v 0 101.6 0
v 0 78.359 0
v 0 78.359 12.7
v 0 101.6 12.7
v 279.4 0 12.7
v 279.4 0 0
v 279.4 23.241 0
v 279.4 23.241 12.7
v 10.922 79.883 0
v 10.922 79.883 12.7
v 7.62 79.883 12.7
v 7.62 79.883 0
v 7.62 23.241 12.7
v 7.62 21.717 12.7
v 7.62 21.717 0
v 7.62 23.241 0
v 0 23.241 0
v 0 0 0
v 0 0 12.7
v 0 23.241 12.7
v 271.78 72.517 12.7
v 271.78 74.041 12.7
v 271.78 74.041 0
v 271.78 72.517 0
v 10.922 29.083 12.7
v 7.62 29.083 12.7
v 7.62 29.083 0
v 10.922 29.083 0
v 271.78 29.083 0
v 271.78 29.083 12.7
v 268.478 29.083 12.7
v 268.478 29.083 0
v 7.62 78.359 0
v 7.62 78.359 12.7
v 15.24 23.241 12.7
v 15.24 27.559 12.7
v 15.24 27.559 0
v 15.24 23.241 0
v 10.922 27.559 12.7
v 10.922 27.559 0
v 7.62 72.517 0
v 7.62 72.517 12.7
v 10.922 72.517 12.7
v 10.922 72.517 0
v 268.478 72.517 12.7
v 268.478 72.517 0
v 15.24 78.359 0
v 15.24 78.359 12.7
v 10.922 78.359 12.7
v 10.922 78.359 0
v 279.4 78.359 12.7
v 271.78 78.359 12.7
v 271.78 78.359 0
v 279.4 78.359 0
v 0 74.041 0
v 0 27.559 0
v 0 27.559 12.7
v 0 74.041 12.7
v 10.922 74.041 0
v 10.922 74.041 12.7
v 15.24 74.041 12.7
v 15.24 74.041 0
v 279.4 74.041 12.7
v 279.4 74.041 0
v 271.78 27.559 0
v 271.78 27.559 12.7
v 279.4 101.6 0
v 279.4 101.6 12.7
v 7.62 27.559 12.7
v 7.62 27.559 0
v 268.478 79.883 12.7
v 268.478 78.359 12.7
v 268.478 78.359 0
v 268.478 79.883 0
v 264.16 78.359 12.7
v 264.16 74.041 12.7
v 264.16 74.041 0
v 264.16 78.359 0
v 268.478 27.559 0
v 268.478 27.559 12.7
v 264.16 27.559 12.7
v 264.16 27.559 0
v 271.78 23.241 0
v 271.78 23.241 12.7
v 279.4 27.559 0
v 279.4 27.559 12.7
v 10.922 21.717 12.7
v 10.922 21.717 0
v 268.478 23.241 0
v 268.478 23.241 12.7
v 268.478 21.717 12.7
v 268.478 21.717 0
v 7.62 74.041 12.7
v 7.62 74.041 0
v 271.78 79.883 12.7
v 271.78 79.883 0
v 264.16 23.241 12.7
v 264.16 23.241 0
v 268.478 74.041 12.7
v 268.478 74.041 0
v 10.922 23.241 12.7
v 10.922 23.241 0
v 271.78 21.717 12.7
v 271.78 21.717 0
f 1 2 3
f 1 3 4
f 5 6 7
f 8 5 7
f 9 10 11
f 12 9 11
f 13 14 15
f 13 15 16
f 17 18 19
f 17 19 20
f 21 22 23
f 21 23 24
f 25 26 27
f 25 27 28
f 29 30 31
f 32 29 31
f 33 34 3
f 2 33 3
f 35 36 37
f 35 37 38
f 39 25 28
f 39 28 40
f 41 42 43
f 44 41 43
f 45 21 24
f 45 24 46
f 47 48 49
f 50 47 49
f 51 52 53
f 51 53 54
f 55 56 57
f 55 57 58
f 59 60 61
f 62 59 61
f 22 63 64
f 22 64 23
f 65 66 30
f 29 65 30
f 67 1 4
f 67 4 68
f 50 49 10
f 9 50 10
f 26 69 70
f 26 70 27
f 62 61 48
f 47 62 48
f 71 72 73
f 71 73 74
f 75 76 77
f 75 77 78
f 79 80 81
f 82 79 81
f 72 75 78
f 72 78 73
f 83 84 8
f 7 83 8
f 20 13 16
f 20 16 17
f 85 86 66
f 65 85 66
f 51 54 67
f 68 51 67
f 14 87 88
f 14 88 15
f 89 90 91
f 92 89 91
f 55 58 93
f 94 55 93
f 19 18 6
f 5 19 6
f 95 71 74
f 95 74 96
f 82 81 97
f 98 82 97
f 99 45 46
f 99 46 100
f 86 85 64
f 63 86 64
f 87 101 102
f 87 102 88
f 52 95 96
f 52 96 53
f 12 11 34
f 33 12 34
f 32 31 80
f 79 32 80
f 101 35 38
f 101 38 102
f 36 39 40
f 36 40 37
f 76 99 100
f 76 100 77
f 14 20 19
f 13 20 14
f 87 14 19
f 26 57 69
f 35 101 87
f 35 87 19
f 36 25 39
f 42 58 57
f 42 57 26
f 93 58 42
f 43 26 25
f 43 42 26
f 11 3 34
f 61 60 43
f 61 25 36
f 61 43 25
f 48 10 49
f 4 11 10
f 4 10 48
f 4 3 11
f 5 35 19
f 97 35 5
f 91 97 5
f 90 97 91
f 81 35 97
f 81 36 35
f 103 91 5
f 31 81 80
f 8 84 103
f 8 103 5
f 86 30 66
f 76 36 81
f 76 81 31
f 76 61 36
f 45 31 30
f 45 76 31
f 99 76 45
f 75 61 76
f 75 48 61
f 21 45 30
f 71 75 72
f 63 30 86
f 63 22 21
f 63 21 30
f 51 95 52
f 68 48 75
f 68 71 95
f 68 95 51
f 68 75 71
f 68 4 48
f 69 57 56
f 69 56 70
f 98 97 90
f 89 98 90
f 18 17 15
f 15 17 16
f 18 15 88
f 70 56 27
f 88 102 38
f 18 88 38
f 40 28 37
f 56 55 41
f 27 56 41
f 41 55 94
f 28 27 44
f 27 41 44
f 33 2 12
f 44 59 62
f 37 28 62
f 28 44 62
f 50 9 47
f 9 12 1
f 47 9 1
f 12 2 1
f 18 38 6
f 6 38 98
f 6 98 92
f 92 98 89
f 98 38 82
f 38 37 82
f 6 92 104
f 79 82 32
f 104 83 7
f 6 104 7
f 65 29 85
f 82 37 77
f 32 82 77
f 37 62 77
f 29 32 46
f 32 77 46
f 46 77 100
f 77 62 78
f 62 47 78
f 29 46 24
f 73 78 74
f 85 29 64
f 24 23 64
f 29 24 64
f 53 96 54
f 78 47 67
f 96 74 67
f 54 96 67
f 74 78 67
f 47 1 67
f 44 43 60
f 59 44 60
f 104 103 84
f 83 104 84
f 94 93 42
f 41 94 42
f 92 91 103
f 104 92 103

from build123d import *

# Parameters (mm, degrees)
SKETCH1_W           = 279.4
SKETCH1_H           = 101.6
BOSS_EXTRUDE1_DEPTH = 12.7
CUT_EXTRUDE1_DEPTH  = 298.570512652


with BuildPart() as part:
    # Sketch1 → Boss-Extrude1 (new body)
    with BuildSketch(Plane.XY):
        with Locations((139.7, 50.8)):
            Rectangle(SKETCH1_W, SKETCH1_H)
    extrude(amount=BOSS_EXTRUDE1_DEPTH)

    # Sketch2 → Cut-Extrude1 (cut, through all)
    with BuildSketch(Plane.XY.offset(12.7)):
        Polygon((279.4, 78.359), (279.4, 74.041), (271.78, 74.041), (271.78, 72.517), (268.478, 72.517), (268.478, 74.041), (264.16, 74.041), (264.16, 78.359), (268.478, 78.359), (268.478, 79.883), (271.78, 79.883), (271.78, 78.359), align=None)
        Polygon((271.78, 23.241), (279.4, 23.241), (279.4, 27.559), (271.78, 27.559), (271.78, 29.083), (268.478, 29.083), (268.478, 27.559), (264.16, 27.559), (264.16, 23.241), (268.478, 23.241), (268.478, 21.717), (271.78, 21.717), align=None)
        Polygon((0, 23.241), (0, 27.559), (7.62, 27.559), (7.62, 29.083), (10.922, 29.083), (10.922, 27.559), (15.24, 27.559), (15.24, 23.241), (10.922, 23.241), (10.922, 21.717), (7.62, 21.717), (7.62, 23.241), align=None)
        Polygon((7.62, 78.359), (0, 78.359), (0, 74.041), (7.62, 74.041), (7.62, 72.517), (10.922, 72.517), (10.922, 74.041), (15.24, 74.041), (15.24, 78.359), (10.922, 78.359), (10.922, 79.883), (7.62, 79.883), align=None)
    extrude(amount=-CUT_EXTRUDE1_DEPTH, mode=Mode.SUBTRACT)


solid = part.part
